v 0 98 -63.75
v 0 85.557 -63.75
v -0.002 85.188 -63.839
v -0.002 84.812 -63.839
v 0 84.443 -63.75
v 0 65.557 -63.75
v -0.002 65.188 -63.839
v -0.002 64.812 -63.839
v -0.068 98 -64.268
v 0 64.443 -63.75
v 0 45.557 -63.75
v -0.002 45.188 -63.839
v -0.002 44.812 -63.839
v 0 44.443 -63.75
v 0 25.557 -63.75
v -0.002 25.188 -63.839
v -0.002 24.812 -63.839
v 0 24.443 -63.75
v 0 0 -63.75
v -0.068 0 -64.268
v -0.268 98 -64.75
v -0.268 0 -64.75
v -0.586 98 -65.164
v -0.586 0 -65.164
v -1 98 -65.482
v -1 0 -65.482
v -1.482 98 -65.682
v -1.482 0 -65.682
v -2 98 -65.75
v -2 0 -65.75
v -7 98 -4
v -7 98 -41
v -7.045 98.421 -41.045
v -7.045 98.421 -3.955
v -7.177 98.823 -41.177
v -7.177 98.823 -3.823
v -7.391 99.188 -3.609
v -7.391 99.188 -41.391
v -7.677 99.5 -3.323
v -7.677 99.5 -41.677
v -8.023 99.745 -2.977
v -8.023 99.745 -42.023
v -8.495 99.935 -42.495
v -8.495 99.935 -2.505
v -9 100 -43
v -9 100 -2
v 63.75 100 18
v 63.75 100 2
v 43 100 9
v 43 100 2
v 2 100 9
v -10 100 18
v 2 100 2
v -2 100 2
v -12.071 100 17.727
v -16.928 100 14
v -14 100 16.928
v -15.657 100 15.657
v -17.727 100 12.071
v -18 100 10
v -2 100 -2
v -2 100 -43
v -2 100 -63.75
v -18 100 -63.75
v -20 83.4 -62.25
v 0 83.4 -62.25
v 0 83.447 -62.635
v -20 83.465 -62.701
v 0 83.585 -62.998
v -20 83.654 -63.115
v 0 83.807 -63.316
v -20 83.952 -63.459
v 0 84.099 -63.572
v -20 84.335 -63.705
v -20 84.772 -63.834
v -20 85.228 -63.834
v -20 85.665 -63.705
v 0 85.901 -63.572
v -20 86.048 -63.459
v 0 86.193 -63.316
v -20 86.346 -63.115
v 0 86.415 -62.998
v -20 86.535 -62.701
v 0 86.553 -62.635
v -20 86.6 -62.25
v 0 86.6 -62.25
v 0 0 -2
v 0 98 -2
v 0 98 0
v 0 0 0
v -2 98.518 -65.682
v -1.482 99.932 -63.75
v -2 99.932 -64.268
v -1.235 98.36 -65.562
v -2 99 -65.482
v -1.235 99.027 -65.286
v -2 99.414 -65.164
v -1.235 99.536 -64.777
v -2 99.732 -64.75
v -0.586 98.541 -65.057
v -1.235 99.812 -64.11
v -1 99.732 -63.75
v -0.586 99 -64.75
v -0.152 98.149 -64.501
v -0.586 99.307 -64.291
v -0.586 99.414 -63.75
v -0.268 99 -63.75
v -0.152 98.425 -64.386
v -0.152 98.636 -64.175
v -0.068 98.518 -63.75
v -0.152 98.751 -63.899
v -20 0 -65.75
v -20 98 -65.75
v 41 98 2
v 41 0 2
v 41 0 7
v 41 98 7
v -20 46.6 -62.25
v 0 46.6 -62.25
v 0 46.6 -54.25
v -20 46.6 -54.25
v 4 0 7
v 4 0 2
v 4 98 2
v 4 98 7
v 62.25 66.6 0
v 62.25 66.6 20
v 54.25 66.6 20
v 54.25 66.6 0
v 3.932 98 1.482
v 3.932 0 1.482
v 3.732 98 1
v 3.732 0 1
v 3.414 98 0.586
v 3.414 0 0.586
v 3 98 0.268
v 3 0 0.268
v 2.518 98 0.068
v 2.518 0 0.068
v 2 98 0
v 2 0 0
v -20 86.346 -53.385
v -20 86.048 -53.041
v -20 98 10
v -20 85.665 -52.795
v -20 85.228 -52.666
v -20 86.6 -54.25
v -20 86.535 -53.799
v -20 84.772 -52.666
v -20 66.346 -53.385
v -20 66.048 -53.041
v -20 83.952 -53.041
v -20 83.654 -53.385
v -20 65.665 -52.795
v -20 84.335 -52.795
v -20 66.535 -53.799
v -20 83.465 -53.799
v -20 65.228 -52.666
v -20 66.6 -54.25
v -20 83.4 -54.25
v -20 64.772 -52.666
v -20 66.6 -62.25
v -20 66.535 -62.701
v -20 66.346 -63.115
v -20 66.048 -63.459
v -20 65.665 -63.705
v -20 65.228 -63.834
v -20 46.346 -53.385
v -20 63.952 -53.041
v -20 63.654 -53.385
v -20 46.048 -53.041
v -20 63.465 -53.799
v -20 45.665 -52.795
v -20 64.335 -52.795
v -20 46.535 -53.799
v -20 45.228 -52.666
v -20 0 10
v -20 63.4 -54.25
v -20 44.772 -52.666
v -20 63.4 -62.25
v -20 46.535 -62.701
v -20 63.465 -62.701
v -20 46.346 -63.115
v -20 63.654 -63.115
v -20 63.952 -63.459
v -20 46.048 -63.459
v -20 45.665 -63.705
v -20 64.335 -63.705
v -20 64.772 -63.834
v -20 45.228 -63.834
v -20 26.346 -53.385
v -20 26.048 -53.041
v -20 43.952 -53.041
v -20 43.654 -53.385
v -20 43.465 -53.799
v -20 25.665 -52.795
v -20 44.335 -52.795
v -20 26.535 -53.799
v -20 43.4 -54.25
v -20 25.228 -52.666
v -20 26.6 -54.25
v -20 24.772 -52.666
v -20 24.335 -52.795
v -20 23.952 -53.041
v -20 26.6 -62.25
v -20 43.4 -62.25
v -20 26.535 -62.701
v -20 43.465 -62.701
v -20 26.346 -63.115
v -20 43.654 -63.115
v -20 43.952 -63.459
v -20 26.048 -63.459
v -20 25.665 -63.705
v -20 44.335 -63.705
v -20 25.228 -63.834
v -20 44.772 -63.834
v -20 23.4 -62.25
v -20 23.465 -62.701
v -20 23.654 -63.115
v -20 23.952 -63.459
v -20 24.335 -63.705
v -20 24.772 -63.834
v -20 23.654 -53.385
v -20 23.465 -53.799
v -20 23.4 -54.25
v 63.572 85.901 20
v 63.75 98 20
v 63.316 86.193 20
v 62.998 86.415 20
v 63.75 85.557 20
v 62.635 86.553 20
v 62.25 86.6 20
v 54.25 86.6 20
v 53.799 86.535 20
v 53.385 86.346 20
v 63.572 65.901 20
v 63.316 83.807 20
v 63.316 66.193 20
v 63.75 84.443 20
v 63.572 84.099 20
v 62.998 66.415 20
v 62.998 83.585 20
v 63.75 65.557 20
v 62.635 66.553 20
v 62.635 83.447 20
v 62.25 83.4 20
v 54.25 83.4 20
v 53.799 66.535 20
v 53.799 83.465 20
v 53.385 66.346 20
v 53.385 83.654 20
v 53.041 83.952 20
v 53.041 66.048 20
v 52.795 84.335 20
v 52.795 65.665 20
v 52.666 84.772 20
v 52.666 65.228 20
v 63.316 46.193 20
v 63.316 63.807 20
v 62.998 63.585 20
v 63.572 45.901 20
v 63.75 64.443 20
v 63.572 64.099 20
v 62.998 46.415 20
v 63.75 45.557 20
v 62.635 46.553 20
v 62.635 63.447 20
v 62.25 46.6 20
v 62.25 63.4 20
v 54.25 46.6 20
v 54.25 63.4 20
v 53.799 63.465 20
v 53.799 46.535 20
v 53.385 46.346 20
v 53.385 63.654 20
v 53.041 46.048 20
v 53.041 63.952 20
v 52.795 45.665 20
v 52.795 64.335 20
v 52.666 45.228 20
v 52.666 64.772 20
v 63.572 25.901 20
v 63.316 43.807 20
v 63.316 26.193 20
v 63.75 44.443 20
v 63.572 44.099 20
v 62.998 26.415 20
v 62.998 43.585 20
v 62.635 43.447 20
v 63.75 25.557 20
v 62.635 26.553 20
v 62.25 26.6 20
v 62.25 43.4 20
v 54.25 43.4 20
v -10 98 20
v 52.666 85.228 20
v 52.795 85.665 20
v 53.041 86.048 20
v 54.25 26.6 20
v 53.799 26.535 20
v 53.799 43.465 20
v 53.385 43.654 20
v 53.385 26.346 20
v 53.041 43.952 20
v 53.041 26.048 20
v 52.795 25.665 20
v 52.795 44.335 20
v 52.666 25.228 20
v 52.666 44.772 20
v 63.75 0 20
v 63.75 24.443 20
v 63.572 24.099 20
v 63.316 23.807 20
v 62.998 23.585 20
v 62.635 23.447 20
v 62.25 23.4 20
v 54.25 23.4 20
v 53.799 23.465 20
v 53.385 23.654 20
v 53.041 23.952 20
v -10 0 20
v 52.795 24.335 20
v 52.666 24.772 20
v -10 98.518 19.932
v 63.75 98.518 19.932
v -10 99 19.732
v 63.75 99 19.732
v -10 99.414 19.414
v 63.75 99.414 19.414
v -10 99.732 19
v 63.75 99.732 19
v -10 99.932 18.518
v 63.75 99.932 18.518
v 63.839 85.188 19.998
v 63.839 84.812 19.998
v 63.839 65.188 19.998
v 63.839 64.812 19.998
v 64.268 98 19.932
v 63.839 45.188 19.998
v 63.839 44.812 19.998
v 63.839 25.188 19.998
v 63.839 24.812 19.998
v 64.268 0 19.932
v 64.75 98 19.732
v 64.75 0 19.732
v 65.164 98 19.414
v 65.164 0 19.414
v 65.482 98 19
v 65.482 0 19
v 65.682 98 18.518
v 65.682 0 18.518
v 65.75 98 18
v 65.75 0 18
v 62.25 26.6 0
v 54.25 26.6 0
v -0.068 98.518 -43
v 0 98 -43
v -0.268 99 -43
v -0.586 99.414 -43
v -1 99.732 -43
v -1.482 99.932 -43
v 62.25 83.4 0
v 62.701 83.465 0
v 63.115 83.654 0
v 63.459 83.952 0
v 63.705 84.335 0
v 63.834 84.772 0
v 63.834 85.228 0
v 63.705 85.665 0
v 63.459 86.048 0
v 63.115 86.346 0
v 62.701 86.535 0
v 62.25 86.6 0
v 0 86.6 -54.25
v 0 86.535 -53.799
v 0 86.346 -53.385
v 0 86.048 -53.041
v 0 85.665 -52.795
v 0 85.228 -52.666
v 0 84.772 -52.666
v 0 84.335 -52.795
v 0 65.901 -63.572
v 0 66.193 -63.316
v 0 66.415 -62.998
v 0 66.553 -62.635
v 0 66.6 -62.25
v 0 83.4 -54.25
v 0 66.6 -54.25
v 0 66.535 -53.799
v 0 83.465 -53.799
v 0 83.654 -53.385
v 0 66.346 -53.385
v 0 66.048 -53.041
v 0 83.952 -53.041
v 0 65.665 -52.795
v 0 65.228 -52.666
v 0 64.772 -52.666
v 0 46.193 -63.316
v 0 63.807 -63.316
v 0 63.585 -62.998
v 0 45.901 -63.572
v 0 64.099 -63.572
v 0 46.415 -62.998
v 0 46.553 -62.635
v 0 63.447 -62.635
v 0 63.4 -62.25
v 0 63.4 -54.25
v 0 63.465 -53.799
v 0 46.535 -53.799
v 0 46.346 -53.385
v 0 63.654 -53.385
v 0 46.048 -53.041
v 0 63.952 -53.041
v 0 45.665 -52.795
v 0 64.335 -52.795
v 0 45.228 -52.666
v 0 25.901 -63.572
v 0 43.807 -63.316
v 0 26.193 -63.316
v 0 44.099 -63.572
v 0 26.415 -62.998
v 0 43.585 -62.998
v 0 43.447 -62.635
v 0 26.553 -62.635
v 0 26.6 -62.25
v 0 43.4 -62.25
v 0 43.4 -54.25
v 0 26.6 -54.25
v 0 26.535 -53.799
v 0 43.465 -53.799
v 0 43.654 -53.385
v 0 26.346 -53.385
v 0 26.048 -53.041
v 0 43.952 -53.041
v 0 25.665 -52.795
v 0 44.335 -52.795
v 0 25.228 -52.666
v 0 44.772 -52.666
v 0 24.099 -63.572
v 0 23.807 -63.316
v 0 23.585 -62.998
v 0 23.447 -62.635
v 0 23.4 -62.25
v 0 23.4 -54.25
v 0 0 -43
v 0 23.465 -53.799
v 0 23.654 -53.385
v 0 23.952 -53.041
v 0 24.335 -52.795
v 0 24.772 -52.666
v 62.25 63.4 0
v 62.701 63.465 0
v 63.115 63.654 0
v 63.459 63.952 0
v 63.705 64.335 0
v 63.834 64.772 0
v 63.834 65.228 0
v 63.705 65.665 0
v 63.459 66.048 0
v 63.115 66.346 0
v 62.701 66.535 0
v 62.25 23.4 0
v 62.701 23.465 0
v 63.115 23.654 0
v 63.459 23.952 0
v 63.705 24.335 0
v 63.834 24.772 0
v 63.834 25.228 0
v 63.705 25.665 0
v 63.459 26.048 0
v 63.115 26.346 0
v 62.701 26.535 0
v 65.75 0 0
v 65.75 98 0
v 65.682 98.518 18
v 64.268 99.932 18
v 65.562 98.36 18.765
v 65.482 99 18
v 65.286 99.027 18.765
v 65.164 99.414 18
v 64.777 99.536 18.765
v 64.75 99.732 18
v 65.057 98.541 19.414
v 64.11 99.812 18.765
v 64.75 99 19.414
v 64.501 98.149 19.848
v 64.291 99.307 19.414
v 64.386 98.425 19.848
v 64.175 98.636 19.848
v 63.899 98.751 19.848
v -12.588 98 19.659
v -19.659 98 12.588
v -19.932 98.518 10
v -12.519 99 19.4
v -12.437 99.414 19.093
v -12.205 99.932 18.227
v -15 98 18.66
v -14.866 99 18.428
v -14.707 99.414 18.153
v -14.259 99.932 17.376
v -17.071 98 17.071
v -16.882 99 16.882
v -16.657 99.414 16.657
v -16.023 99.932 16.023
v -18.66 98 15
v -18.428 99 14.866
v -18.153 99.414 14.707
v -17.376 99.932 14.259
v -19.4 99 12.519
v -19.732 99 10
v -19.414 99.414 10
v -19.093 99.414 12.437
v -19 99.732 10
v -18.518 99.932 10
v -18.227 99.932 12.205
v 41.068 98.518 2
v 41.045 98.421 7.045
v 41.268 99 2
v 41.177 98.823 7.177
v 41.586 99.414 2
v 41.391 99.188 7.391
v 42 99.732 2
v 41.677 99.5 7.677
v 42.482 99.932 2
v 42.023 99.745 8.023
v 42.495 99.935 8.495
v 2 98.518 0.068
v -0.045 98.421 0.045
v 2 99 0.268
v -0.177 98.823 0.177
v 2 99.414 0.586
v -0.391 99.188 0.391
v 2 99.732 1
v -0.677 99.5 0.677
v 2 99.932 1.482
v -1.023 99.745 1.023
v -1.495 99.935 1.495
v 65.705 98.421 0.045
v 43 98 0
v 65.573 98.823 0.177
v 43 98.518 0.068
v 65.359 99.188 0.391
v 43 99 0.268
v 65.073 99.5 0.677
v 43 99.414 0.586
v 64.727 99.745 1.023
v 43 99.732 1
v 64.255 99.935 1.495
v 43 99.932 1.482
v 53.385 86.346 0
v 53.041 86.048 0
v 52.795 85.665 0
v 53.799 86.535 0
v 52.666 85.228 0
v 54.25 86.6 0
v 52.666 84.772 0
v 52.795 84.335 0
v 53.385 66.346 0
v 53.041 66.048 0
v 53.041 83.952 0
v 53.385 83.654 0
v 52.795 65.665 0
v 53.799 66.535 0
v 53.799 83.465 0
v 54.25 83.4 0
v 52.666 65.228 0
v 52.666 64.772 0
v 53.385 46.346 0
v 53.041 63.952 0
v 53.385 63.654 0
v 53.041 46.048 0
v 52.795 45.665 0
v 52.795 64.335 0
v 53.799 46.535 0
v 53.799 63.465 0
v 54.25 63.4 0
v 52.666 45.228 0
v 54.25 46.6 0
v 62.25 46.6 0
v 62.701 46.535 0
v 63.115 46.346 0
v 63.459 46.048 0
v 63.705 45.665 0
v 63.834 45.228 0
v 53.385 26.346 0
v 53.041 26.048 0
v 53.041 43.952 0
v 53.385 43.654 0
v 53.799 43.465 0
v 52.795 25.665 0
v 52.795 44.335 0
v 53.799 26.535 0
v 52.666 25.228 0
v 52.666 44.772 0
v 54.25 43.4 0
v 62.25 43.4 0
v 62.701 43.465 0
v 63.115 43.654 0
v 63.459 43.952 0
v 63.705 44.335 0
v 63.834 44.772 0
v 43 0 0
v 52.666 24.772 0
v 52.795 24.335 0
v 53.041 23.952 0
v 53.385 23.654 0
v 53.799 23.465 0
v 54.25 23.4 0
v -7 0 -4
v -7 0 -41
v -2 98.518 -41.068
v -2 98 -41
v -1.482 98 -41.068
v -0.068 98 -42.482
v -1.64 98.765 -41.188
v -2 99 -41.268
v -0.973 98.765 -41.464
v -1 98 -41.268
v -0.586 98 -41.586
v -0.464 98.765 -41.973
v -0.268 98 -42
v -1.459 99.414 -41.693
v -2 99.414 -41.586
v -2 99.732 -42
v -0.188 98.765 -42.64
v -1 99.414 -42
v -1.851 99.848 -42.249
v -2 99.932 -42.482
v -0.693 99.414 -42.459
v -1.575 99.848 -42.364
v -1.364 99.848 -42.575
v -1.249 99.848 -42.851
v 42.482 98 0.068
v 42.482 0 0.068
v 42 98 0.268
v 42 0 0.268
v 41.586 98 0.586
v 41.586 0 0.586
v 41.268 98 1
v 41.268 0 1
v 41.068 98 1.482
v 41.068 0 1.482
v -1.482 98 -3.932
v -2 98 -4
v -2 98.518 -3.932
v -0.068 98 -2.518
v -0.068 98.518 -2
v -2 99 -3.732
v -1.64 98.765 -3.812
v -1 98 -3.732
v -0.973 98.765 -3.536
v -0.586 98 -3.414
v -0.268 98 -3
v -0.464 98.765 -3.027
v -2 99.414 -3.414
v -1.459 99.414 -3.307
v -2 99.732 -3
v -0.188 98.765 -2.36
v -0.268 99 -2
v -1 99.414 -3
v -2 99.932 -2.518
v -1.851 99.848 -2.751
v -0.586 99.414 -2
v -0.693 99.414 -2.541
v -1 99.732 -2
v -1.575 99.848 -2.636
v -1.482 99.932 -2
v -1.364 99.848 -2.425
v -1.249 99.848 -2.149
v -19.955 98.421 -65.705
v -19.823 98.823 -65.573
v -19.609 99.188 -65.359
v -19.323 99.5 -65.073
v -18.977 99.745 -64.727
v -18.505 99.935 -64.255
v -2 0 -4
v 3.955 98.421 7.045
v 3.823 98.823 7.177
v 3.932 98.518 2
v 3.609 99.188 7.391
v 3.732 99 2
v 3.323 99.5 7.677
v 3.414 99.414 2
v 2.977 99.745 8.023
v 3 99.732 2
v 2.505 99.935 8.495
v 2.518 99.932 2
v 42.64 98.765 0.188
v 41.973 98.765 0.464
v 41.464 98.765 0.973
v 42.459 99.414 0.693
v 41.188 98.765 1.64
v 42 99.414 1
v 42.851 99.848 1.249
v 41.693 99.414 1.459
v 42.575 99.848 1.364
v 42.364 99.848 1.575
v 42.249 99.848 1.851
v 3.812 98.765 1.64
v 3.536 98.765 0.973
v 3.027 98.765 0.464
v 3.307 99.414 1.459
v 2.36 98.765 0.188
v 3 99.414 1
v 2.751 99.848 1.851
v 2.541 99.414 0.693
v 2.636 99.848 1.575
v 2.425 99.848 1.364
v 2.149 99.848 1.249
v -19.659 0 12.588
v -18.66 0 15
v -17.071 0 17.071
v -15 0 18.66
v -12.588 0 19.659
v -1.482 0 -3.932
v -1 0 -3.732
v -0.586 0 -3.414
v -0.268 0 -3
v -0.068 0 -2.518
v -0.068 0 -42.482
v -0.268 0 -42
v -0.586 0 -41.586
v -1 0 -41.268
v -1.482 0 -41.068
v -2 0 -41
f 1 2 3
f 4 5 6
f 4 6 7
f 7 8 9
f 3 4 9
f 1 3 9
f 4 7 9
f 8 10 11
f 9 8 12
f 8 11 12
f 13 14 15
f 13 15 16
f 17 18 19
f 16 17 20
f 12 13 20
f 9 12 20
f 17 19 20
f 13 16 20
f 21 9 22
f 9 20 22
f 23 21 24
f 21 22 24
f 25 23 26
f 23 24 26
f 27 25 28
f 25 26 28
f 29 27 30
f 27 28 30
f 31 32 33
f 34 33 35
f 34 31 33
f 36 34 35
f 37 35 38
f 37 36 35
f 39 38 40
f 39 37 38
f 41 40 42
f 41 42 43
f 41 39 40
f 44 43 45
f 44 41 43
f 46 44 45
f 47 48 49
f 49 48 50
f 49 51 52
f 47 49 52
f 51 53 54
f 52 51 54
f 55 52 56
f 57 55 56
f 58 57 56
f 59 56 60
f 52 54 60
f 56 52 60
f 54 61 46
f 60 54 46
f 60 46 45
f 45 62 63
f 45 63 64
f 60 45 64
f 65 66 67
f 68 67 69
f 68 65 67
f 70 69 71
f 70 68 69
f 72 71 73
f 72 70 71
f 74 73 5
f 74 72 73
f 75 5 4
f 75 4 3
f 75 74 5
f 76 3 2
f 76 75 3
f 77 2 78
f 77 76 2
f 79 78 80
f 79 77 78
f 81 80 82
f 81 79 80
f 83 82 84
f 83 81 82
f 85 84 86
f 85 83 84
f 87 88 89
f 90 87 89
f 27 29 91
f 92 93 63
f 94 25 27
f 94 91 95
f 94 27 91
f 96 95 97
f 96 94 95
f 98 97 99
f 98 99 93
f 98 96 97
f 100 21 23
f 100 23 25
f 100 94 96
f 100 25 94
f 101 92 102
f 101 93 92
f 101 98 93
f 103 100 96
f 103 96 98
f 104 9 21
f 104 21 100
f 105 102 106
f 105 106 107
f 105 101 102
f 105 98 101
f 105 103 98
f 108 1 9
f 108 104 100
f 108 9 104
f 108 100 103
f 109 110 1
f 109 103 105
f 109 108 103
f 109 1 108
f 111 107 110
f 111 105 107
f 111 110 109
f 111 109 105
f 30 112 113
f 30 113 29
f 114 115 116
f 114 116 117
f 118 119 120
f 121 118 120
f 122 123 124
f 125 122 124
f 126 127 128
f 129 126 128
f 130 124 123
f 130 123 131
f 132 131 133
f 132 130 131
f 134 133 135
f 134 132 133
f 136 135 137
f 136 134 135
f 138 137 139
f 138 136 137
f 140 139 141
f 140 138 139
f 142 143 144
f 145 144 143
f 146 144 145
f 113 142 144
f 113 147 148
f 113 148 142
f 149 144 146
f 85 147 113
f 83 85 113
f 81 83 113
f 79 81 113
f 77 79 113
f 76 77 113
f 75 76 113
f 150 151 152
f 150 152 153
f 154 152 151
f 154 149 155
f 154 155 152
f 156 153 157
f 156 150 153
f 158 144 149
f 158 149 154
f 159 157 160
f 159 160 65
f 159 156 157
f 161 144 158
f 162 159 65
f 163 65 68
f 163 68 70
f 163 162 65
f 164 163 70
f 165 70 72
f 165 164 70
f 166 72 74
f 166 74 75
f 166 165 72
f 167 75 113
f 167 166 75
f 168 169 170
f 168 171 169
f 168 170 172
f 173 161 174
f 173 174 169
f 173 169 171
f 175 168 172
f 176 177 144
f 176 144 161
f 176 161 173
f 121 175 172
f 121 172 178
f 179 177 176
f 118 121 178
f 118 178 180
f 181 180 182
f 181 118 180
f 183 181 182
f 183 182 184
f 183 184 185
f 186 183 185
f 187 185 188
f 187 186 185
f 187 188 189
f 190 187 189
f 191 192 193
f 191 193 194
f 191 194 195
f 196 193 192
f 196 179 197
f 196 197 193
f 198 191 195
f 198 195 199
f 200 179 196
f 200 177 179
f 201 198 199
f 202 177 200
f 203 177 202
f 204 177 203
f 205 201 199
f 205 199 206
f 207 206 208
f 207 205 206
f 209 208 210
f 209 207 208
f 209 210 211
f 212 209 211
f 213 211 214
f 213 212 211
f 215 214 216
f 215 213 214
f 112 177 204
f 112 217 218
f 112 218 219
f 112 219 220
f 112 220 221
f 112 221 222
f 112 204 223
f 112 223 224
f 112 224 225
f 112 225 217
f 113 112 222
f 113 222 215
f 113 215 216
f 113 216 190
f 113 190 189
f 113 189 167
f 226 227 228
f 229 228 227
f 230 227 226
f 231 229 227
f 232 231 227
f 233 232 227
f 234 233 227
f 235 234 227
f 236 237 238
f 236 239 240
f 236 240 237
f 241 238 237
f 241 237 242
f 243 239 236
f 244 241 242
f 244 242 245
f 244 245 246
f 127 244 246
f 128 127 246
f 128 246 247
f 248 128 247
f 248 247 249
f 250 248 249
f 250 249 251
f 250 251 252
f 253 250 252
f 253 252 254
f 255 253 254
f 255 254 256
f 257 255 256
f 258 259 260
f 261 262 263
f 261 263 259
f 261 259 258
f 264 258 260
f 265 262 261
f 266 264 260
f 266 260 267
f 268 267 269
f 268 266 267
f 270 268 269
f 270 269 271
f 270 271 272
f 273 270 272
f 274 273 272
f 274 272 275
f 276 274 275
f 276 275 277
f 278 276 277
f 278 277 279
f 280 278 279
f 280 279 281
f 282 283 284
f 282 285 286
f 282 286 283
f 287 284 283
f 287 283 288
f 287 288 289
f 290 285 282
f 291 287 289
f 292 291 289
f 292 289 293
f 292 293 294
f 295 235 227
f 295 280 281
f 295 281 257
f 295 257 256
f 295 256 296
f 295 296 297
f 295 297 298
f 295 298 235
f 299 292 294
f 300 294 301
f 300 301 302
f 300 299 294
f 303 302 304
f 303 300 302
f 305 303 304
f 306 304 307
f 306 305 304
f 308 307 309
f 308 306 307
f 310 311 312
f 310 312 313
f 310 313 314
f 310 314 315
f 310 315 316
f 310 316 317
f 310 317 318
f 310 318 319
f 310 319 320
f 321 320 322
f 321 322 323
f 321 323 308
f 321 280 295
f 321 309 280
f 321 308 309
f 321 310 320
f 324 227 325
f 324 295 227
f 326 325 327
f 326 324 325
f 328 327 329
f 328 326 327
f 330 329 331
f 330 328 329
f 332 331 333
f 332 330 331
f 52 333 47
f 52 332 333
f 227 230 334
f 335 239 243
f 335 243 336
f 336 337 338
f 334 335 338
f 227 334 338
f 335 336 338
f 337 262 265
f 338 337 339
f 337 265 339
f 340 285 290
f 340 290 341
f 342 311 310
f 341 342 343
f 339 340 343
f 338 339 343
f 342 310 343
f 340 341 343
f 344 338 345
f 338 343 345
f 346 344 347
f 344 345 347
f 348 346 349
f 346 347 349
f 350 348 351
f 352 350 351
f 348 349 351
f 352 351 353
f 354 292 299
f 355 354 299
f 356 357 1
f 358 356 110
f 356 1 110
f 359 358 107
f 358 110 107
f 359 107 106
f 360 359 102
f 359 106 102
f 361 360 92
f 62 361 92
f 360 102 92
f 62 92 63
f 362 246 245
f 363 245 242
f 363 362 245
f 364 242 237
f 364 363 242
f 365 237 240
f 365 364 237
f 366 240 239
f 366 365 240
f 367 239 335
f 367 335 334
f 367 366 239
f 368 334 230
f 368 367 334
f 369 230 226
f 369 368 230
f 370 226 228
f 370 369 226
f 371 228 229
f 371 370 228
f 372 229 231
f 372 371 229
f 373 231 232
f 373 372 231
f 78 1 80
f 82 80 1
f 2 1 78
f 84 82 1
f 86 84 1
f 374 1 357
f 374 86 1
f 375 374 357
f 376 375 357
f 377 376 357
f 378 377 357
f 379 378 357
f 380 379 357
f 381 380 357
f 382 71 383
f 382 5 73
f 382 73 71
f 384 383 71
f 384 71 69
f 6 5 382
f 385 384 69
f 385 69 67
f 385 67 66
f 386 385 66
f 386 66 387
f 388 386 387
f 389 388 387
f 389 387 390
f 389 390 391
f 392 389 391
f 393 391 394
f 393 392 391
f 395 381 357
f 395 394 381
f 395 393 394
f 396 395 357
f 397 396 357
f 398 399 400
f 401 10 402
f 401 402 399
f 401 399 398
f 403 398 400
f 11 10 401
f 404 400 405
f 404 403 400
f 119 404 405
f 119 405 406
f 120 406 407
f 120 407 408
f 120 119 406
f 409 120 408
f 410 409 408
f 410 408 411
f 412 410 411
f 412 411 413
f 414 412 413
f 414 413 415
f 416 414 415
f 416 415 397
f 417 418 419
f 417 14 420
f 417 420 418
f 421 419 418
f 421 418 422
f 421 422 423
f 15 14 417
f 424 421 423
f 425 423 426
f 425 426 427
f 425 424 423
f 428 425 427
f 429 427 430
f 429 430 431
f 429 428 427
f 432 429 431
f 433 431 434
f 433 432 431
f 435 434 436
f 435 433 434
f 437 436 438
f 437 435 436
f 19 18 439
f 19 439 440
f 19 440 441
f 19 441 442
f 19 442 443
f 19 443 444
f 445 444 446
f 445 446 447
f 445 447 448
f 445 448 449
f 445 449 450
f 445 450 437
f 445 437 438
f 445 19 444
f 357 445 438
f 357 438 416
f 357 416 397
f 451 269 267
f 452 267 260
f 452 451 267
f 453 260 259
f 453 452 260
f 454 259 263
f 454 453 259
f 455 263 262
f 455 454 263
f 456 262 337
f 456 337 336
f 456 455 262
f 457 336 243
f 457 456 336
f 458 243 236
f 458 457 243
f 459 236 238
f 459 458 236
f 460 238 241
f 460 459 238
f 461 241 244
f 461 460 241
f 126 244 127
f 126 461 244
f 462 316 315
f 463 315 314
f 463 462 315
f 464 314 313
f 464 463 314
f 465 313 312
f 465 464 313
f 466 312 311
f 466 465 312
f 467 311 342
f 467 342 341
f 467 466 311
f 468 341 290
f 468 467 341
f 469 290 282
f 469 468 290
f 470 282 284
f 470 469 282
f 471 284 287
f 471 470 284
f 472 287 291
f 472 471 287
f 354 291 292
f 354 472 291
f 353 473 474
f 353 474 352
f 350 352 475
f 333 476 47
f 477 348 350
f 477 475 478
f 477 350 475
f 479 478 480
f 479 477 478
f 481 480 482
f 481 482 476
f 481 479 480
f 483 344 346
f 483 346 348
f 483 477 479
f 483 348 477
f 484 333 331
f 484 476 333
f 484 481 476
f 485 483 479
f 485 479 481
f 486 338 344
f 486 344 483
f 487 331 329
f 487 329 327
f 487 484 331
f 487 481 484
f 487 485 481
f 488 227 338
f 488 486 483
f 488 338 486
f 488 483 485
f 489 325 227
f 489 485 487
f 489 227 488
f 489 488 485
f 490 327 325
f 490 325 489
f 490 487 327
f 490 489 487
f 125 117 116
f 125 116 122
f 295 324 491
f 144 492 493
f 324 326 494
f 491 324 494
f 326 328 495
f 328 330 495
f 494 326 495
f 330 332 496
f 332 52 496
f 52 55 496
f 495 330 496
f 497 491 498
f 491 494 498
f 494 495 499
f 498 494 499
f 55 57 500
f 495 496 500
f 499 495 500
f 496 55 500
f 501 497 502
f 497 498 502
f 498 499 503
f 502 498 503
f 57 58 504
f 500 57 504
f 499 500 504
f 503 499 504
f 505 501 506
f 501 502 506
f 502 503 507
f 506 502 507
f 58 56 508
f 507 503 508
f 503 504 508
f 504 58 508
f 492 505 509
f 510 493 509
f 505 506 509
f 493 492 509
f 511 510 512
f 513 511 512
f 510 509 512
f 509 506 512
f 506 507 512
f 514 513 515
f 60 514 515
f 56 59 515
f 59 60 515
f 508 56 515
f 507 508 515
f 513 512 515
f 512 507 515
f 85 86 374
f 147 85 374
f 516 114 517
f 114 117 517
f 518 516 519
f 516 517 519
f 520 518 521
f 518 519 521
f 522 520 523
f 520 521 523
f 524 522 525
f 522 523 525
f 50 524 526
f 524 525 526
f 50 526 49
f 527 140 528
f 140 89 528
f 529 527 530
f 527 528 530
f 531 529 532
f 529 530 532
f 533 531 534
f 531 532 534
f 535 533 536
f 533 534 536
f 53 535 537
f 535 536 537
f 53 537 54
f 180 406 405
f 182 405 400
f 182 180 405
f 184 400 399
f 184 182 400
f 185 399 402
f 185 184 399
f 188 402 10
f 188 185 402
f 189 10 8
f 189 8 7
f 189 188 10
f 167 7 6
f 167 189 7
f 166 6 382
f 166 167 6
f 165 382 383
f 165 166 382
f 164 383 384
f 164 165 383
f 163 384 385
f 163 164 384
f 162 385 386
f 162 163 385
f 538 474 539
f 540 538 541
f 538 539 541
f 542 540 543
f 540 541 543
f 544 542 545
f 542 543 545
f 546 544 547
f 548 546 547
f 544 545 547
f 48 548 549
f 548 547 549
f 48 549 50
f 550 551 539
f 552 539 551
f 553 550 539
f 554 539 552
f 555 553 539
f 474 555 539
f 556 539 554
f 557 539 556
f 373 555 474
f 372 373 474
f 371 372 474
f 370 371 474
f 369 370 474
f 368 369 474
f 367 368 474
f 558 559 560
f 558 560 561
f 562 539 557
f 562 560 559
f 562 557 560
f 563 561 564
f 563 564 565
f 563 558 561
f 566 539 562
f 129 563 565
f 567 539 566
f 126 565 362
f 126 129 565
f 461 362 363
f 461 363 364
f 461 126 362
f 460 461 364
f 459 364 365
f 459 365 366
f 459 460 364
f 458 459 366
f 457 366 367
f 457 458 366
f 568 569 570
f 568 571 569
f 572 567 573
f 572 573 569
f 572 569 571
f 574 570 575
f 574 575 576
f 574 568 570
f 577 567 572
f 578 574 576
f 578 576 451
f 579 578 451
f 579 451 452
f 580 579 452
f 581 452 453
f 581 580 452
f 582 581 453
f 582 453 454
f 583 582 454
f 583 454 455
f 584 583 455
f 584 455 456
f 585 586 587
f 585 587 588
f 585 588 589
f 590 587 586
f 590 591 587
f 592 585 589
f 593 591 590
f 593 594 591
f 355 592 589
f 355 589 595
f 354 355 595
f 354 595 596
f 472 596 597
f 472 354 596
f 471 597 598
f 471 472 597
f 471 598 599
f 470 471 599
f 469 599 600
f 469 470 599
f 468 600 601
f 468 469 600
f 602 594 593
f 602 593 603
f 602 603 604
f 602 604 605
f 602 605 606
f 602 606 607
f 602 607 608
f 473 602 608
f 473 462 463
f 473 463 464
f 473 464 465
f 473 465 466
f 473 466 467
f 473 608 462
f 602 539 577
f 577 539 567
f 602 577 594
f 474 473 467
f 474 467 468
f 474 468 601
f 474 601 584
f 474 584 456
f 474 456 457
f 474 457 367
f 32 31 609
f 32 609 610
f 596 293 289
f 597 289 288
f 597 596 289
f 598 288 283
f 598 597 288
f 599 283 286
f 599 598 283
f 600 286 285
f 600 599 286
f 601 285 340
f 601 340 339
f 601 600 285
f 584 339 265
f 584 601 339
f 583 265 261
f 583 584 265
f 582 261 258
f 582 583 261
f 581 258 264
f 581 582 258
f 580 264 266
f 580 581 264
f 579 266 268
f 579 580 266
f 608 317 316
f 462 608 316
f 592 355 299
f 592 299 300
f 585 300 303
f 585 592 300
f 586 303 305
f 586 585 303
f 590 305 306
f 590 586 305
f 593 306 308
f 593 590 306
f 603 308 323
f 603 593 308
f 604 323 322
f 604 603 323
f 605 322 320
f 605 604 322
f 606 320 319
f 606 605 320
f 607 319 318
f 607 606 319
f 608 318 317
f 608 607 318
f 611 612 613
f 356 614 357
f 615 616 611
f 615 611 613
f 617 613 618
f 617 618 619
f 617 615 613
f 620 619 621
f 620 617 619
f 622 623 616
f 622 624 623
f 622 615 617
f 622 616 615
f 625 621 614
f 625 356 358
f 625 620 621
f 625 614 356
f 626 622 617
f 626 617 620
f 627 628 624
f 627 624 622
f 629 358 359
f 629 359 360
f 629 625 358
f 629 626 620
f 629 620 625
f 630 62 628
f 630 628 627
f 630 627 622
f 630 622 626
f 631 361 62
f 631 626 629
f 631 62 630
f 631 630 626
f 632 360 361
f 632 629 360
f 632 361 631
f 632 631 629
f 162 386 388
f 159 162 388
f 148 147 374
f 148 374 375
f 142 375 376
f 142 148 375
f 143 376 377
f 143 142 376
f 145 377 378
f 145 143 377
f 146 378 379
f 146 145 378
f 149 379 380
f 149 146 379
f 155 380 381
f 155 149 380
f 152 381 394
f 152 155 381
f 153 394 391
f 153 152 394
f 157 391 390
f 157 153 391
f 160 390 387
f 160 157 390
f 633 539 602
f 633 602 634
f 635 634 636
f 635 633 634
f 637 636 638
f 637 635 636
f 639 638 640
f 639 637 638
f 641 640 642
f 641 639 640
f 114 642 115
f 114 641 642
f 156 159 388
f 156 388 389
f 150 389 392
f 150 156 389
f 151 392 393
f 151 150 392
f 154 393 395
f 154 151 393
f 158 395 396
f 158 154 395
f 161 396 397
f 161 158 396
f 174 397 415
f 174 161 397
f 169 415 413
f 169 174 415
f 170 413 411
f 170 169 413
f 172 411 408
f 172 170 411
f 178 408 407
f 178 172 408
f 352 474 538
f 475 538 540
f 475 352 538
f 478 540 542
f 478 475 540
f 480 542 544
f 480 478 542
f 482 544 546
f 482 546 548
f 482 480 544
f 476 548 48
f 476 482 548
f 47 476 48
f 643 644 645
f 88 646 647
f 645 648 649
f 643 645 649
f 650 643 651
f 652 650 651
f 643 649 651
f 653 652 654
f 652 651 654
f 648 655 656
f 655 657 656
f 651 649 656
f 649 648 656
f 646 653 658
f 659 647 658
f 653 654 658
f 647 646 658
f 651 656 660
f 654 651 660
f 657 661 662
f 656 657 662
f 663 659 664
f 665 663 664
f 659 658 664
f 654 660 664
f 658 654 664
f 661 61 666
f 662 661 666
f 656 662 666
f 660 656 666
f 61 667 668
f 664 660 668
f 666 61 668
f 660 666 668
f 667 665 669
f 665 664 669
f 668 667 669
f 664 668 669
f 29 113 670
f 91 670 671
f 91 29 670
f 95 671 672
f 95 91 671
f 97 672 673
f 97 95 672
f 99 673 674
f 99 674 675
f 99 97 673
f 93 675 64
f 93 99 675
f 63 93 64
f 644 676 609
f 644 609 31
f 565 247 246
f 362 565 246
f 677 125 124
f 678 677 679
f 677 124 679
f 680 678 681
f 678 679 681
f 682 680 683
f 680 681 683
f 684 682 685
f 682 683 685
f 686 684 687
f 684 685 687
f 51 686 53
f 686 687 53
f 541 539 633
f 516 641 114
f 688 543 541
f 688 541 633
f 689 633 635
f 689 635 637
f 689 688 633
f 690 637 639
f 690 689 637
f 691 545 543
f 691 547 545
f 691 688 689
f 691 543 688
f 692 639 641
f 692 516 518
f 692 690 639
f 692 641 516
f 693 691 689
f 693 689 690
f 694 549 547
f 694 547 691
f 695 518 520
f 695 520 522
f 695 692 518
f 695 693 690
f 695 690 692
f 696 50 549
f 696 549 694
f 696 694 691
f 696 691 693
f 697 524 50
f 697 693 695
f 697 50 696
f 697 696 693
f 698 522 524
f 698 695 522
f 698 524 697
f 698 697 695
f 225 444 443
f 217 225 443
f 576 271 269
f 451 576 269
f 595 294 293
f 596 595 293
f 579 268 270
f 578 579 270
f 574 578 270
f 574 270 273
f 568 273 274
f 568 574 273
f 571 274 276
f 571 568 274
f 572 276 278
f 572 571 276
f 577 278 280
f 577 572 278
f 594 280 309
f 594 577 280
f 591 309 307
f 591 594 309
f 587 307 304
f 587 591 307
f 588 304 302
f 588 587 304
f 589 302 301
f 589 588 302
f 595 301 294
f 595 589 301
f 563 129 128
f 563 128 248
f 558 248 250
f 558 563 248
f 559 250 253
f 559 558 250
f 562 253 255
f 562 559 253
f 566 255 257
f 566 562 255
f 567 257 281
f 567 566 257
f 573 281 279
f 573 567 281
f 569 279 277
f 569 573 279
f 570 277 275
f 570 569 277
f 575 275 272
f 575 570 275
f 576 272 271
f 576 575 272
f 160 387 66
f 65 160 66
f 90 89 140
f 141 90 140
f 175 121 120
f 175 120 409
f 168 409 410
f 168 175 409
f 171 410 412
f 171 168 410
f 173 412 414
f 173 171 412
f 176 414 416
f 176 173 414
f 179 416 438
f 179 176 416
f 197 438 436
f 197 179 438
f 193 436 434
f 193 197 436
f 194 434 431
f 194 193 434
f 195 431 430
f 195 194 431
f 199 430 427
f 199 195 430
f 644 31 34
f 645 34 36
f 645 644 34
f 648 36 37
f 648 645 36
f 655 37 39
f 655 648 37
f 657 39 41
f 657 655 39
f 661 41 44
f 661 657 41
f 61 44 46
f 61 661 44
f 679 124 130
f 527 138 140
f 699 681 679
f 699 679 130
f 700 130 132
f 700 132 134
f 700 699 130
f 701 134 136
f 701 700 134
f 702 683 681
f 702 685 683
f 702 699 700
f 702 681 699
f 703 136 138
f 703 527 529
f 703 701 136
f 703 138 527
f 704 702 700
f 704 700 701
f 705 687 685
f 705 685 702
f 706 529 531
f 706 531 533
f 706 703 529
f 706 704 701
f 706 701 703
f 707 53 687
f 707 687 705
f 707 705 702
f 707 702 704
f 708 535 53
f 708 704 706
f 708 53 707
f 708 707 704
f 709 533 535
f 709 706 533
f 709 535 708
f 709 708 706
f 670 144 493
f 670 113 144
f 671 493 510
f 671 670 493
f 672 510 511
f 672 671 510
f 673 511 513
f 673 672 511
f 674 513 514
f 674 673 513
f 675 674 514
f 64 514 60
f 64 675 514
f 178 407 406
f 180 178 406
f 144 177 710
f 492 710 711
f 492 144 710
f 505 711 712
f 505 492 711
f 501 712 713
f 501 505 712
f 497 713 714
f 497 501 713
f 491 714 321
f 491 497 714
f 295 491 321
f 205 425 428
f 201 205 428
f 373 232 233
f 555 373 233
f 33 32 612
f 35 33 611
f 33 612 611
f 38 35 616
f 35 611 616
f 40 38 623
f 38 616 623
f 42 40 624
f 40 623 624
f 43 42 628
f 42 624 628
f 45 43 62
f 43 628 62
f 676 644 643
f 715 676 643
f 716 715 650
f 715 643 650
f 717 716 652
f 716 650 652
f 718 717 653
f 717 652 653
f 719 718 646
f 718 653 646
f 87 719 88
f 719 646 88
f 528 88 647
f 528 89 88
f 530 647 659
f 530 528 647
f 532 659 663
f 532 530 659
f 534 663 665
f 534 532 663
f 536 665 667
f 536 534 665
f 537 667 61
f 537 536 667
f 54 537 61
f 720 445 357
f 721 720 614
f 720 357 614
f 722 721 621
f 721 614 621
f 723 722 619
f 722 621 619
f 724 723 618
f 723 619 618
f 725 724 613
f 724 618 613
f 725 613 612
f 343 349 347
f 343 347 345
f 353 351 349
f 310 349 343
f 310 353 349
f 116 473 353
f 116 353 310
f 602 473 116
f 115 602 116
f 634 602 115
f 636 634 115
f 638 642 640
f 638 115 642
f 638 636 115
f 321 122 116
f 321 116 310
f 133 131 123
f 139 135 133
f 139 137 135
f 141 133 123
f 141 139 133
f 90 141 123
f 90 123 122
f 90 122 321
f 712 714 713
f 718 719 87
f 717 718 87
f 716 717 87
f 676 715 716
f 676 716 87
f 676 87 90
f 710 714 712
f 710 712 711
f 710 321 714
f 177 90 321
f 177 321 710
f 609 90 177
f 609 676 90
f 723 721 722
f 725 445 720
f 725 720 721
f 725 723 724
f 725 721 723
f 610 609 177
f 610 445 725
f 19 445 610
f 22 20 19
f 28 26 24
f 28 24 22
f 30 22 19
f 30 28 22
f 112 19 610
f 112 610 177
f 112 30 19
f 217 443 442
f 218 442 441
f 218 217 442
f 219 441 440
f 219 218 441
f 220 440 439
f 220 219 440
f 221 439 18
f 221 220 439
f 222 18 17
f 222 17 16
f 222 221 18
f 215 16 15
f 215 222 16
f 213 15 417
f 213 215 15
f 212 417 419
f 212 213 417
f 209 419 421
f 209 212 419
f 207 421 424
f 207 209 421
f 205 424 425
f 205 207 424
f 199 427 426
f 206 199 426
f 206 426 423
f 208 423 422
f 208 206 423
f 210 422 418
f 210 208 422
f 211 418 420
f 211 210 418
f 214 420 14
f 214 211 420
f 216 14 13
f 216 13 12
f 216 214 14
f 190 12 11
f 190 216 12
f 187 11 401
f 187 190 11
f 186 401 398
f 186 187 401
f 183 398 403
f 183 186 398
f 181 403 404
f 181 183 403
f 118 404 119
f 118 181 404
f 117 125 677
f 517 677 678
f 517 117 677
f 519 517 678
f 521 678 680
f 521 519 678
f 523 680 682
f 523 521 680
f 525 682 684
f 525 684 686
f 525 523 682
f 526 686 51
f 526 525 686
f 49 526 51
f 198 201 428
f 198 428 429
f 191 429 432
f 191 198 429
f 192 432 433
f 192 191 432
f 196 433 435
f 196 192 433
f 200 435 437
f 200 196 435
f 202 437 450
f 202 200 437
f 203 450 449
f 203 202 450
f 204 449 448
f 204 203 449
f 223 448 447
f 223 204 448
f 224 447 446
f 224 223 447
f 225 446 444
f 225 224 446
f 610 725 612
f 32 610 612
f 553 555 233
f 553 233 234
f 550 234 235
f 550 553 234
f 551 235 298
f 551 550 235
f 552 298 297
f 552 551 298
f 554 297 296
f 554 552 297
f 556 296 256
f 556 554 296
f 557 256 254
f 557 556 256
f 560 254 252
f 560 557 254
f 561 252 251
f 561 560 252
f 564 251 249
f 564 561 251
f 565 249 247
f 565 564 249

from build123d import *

# Parameters (mm, degrees)
BOSS_EXTRUDE1_DEPTH = 100
SKETCH2_W           = 37
SKETCH2_H           = 112.688383797
CUT_EXTRUDE1_DEPTH  = 7
SKETCH3_W           = 37
SKETCH3_H           = 114.700676364
CUT_EXTRUDE2_DEPTH  = 7
CUT_EXTRUDE3_DEPTH  = 148.228139294
CUT_EXTRUDE4_DEPTH  = 137.550814717
FILLET1_R           = 10
FILLET2_R           = 2
FILLET3_R           = 2
FILLET4_R           = 2


with BuildPart() as part:
    # Sketch1 → Boss-Extrude1 (new body)
    with BuildSketch(Plane(origin=(0, 0, 0), x_dir=(1, 0, 0), z_dir=(0, 1, 0))):
        Polygon((0, 0), (65.75, 0), (65.75, -20), (-20, -20), (-20, 65.75), (0, 65.75), align=None)
    extrude(amount=BOSS_EXTRUDE1_DEPTH)

    # Sketch2 → Cut-Extrude1 (cut)
    with BuildSketch(Plane(origin=(0, 0, 0), x_dir=(0, 0, -1), z_dir=(1, 0, 0))):
        with Locations((22.5, 52.54890392)):
            Rectangle(SKETCH2_W, SKETCH2_H)
    extrude(amount=-CUT_EXTRUDE1_DEPTH, mode=Mode.SUBTRACT)

    # Sketch3 → Cut-Extrude2 (cut)
    with BuildSketch(Plane(origin=(0, 0, 0), x_dir=(-1, 0, 0), z_dir=(0, 0, -1))):
        with Locations((-22.5, 48.993853716)):
            Rectangle(SKETCH3_W, SKETCH3_H)
    extrude(amount=-CUT_EXTRUDE2_DEPTH, mode=Mode.SUBTRACT)

    # Sketch4 → Cut-Extrude3 (cut, through all)
    with BuildSketch(Plane.ZY.offset(20)):
        with BuildLine():
            Line((-62.25, 86.6), (-54.25, 86.6))
            ThreePointArc((-54.25, 86.6), (-52.65, 85), (-54.25, 83.4))
            Line((-54.25, 83.4), (-62.25, 83.4))
            ThreePointArc((-62.25, 83.4), (-63.85, 85), (-62.25, 86.6))
        make_face()
        with BuildLine():
            Line((-62.25, 66.6), (-54.25, 66.6))
            ThreePointArc((-54.25, 66.6), (-52.65, 65), (-54.25, 63.4))
            Line((-54.25, 63.4), (-62.25, 63.4))
            ThreePointArc((-62.25, 63.4), (-63.85, 65), (-62.25, 66.6))
        make_face()
        with BuildLine():
            Line((-62.25, 46.6), (-54.25, 46.6))
            ThreePointArc((-54.25, 46.6), (-52.65, 45), (-54.25, 43.4))
            Line((-54.25, 43.4), (-62.25, 43.4))
            ThreePointArc((-62.25, 43.4), (-63.85, 45), (-62.25, 46.6))
        make_face()
        with BuildLine():
            Line((-62.25, 26.6), (-54.25, 26.6))
            ThreePointArc((-54.25, 26.6), (-52.65, 25), (-54.25, 23.4))
            Line((-54.25, 23.4), (-62.25, 23.4))
            ThreePointArc((-62.25, 23.4), (-63.85, 25), (-62.25, 26.6))
        make_face()
    extrude(amount=-CUT_EXTRUDE3_DEPTH, mode=Mode.SUBTRACT)

    # Sketch6 → Cut-Extrude4 (cut, through all)
    with BuildSketch(Plane(origin=(0, 0, 0), x_dir=(-1, 0, 0), z_dir=(0, 0, -1))):
        with BuildLine():
            Line((-62.25, 86.6), (-54.25, 86.6))
            ThreePointArc((-54.25, 86.6), (-52.65, 85), (-54.25, 83.4))
            Line((-54.25, 83.4), (-62.25, 83.4))
            ThreePointArc((-62.25, 83.4), (-63.85, 85), (-62.25, 86.6))
        make_face()
        with BuildLine():
            Line((-62.25, 66.6), (-54.25, 66.6))
            ThreePointArc((-54.25, 66.6), (-52.65, 65), (-54.25, 63.4))
            Line((-54.25, 63.4), (-62.25, 63.4))
            ThreePointArc((-62.25, 63.4), (-63.85, 65), (-62.25, 66.6))
        make_face()
        with BuildLine():
            Line((-62.25, 46.6), (-54.25, 46.6))
            ThreePointArc((-54.25, 46.6), (-52.65, 45), (-54.25, 43.4))
            Line((-54.25, 43.4), (-62.25, 43.4))
            ThreePointArc((-62.25, 43.4), (-63.85, 45), (-62.25, 46.6))
        make_face()
        with BuildLine():
            Line((-62.25, 26.6), (-54.25, 26.6))
            ThreePointArc((-54.25, 26.6), (-52.65, 25), (-54.25, 23.4))
            Line((-54.25, 23.4), (-62.25, 23.4))
            ThreePointArc((-62.25, 23.4), (-63.85, 25), (-62.25, 26.6))
        make_face()
    extrude(amount=-CUT_EXTRUDE4_DEPTH, mode=Mode.SUBTRACT)

    # Fillet1
    fillet1_edges = [part.edges().sort_by_distance(p)[0] for p in [
        (-20, 50, 20),
    ]]
    fillet(fillet1_edges, radius=FILLET1_R)

    # Fillet2
    fillet2_edges = [part.edges().sort_by_distance(p)[0] for p in [
        (0, 50, -41),
        (0, 50, -4),
        (4, 50, 0),
        (41, 50, 0),
    ]]
    fillet(fillet2_edges, radius=FILLET2_R)

    # Fillet3
    fillet3_edges = [part.edges().sort_by_distance(p)[0] for p in [
        (-20, 100, -27.875),
        (65.75, 100, 10),
        (27.875, 100, 20),
        (-17.071067812, 100, 17.071067812),
        (4, 100, 4.5),
        (1, 100, 0),
        (-4.5, 100, -41),
        (0, 100, -54.375),
        (-0.585786438, 100, -3.414213562),
        (-0.585786438, 100, -41.585786438),
        (3.414213562, 100, 0.585786438),
        (41.585786438, 100, 0.585786438),
        (54.375, 100, 0),
        (-4.5, 100, -4),
        (-7, 100, -22.5),
        (0, 100, -1),
        (41, 100, 4.5),
        (22.5, 100, 7),
        (-10, 100, -65.75),
    ]]
    fillet(fillet3_edges, radius=FILLET3_R)

    # Fillet4
    # the kernel refuses this fillet: 2 mm, written as the material it takes off along each edge
    with BuildSketch(Plane(origin=(-2, 98, -63.75), x_dir=(0, 0, -1), z_dir=(1, 0, 0))) as fillet4_piece_1_section:
        Polygon((0, 0), (FILLET4_R, 0), (FILLET4_R, FILLET4_R), (0, FILLET4_R), align=None)
    fillet4_piece_1 = extrude(amount=FILLET4_R, mode=Mode.PRIVATE)
    fillet4_piece_1 = fillet4_piece_1 - Plane(origin=(-2, 98, -63.75), x_dir=(0, -0.7071067811865475, 0.7071067811865475), z_dir=(1, 0, 0)) * Sphere(FILLET4_R, mode=Mode.PRIVATE)
    add(fillet4_piece_1, mode=Mode.SUBTRACT)
    with BuildSketch(Plane(origin=(63.75, 98, 18), x_dir=(1, 0, 0), z_dir=(0, 0, 1))) as fillet4_piece_2_section:
        Polygon((0, 0), (FILLET4_R, 0), (FILLET4_R, FILLET4_R), (0, FILLET4_R), align=None)
    fillet4_piece_2 = extrude(amount=FILLET4_R, mode=Mode.PRIVATE)
    fillet4_piece_2 = fillet4_piece_2 - Plane(origin=(63.75, 98, 18), x_dir=(-0.7071067811865475, -0.7071067811865475, 0), z_dir=(0, 0, 1)) * Sphere(FILLET4_R, mode=Mode.PRIVATE)
    add(fillet4_piece_2, mode=Mode.SUBTRACT)
    with BuildSketch(Plane(origin=(65.75, -5, 20), x_dir=(-1, 0, 0), z_dir=(0, 1, 0)), Plane(origin=(0, -5, -65.75), x_dir=(0, 0, 1), z_dir=(0, 1, 0))) as fillet4_piece_3:
        with BuildLine():
            CenterArc((FILLET4_R, -FILLET4_R), FILLET4_R, 90, 90)
            Line((0, -FILLET4_R), (0, 0))
            Line((0, 0), (FILLET4_R, 0))
        make_face()
    extrude(amount=103, mode=Mode.SUBTRACT)


solid = part.part
